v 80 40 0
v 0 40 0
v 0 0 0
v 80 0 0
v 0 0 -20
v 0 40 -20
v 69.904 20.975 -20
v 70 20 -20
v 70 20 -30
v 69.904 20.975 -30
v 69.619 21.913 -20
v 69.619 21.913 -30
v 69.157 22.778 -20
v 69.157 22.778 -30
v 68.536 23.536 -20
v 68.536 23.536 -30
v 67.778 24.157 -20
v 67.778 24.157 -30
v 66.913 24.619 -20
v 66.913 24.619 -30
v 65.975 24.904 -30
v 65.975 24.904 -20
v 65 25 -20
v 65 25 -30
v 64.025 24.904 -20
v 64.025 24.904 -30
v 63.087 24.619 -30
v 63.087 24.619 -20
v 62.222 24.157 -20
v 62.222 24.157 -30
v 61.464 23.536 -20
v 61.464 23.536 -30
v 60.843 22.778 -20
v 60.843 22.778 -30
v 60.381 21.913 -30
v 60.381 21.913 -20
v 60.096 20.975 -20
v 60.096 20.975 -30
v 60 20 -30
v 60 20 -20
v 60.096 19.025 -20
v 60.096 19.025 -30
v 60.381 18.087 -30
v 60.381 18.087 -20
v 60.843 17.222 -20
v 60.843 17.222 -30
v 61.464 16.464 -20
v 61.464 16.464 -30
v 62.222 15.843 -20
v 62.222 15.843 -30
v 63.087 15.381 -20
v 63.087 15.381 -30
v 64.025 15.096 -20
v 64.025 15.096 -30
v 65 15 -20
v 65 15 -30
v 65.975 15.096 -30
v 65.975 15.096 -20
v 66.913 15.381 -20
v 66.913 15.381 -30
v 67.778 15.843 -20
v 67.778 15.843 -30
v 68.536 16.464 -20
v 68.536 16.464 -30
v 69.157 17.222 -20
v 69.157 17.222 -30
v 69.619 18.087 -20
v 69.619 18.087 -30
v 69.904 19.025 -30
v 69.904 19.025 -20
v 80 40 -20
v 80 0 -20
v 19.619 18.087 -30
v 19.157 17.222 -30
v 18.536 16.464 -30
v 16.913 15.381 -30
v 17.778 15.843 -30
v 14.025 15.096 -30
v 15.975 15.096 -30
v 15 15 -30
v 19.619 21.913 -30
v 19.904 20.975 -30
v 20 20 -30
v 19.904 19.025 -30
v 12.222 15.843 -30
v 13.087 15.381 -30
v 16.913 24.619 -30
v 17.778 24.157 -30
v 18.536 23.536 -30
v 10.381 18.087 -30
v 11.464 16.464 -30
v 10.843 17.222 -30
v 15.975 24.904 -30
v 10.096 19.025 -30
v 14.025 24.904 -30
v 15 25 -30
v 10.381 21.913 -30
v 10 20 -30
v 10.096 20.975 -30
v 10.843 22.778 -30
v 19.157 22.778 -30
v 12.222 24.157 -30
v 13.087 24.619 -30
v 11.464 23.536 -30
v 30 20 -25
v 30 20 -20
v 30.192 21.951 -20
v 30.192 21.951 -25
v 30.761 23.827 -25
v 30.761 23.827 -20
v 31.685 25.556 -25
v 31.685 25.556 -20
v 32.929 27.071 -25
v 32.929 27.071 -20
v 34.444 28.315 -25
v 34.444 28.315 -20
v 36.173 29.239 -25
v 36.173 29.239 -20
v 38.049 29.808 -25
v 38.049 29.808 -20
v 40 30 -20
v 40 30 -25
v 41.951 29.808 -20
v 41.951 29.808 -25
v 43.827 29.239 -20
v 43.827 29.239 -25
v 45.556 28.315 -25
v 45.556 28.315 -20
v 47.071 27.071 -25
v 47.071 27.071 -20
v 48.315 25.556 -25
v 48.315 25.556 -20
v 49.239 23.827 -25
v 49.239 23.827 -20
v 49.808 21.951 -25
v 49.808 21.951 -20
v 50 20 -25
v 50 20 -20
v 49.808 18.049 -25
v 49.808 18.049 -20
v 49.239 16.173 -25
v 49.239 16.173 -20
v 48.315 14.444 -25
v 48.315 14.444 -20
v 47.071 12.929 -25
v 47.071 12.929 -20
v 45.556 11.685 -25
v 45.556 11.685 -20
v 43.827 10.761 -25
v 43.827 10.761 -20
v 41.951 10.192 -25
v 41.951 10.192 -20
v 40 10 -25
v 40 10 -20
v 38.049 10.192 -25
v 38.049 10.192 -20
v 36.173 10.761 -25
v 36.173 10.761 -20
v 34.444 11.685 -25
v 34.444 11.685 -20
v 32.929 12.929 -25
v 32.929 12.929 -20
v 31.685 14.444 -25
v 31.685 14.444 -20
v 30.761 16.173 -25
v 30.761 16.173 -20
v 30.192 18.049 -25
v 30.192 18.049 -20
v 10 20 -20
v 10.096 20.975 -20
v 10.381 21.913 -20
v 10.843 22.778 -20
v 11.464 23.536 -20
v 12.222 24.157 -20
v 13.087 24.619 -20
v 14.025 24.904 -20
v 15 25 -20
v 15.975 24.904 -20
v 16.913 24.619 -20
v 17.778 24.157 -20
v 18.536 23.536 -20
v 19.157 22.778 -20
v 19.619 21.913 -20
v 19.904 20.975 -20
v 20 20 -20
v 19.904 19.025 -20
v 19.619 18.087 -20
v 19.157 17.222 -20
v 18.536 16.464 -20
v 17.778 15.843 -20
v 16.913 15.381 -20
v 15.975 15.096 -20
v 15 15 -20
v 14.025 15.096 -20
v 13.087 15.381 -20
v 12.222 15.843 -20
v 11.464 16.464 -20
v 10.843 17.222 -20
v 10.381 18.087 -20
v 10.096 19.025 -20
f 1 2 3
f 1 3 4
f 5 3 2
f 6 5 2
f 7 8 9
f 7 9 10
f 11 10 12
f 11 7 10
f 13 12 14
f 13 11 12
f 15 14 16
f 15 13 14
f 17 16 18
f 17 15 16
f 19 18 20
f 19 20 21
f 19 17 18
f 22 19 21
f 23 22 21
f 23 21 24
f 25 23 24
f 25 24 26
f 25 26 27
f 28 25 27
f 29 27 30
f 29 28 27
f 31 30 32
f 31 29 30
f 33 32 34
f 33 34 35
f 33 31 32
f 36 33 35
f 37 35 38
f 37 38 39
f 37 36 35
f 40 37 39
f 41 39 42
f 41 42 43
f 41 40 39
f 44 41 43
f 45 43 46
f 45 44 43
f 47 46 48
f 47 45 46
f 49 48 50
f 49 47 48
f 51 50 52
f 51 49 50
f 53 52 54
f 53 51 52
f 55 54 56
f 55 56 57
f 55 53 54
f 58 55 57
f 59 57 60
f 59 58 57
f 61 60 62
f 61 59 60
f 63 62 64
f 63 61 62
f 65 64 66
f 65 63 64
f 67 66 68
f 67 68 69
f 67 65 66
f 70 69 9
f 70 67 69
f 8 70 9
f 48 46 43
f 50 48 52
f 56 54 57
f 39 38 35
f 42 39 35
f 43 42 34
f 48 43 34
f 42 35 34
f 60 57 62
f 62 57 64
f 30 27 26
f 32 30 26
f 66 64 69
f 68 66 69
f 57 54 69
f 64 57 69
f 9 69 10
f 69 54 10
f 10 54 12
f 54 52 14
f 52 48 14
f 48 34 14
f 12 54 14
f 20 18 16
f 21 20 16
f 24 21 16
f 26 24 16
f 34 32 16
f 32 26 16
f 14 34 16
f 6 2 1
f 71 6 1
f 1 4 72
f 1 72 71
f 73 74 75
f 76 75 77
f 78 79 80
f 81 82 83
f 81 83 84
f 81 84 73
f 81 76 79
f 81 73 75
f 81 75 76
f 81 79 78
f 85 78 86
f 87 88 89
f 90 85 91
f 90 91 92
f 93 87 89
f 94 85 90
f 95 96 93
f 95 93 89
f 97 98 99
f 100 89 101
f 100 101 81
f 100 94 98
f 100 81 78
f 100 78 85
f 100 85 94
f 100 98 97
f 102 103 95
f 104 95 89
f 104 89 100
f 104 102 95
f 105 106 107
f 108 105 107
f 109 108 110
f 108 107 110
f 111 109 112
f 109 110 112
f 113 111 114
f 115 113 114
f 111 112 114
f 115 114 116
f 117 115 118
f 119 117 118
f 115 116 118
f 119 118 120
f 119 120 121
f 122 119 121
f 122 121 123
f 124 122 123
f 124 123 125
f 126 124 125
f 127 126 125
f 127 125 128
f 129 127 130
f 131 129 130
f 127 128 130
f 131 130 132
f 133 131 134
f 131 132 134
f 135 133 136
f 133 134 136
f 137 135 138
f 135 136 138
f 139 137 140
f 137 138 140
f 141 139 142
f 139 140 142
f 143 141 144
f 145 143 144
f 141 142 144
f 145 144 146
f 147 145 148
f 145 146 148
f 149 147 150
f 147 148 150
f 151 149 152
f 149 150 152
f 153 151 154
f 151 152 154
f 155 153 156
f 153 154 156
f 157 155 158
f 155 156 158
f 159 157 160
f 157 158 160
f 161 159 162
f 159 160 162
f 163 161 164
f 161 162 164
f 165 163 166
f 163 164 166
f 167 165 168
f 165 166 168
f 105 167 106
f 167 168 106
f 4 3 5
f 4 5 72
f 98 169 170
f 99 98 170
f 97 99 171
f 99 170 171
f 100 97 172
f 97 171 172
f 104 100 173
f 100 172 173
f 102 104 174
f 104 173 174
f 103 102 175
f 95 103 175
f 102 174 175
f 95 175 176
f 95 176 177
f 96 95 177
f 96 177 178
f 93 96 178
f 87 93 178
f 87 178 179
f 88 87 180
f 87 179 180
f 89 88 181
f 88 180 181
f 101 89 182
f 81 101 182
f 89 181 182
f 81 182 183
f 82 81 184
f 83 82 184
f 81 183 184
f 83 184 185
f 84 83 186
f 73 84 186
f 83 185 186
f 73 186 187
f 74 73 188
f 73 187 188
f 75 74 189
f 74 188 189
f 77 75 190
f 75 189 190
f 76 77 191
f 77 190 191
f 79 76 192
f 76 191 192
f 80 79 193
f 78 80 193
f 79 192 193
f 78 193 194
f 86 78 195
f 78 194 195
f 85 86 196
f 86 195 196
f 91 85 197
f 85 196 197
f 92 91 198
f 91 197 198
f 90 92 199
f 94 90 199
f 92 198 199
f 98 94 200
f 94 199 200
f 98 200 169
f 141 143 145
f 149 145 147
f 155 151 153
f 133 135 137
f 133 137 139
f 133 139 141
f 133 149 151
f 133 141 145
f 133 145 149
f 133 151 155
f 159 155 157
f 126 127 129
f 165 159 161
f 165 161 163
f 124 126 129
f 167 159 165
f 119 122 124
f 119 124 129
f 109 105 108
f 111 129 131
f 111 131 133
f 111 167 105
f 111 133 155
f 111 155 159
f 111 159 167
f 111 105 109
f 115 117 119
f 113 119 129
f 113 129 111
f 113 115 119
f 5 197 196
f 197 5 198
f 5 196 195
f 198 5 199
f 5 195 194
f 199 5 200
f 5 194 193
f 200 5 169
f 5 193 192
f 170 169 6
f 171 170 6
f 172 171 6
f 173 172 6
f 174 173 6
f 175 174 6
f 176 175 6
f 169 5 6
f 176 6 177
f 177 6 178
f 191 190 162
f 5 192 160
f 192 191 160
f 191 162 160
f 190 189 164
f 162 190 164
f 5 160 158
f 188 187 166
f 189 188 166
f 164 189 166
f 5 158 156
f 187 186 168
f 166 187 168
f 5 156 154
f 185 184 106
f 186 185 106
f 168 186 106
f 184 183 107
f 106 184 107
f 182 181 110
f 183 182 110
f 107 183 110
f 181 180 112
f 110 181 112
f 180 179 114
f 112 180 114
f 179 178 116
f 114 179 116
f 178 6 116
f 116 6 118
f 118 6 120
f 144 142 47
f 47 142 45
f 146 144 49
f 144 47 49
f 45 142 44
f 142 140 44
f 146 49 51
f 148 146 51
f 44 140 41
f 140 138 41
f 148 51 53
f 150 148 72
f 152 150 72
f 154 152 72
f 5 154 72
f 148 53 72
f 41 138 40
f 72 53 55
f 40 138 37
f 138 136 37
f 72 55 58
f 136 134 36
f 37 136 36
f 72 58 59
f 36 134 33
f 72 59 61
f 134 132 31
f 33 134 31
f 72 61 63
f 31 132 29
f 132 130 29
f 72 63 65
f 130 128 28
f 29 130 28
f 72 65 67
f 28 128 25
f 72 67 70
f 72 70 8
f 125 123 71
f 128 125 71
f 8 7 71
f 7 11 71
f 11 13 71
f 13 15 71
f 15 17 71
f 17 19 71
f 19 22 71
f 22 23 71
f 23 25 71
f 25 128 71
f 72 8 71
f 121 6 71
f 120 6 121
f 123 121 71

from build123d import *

# Parameters (mm, degrees)
SKETCH1_W           = 80
SKETCH1_H           = 40
BOSS_EXTRUDE1_DEPTH = 20
SKETCH2_R           = 10
BOSS_EXTRUDE2_DEPTH = 5
SKETCH3_R           = 5
BOSS_EXTRUDE3_DEPTH = 10


with BuildPart() as part:
    # Sketch1 → Boss-Extrude1 (new body)
    with BuildSketch(Plane.XY):
        with Locations((40, 20)):
            Rectangle(SKETCH1_W, SKETCH1_H)
    extrude(amount=-BOSS_EXTRUDE1_DEPTH)

    # Sketch2 → Boss-Extrude2 (add)
    with BuildSketch(Plane(origin=(0, 0, -20), x_dir=(-1, 0, 0), z_dir=(0, 0, -1))):
        with Locations((-40, 20)):
            Circle(SKETCH2_R)
    extrude(amount=BOSS_EXTRUDE2_DEPTH)

    # Sketch3 → Boss-Extrude3 (add)
    with BuildSketch(Plane(origin=(0, 0, -20), x_dir=(-1, 0, 0), z_dir=(0, 0, -1))):
        with Locations((-15, 20)):
            Circle(SKETCH3_R)
    boss_extrude3 = extrude(amount=BOSS_EXTRUDE3_DEPTH)

    # Mirror1: Boss-Extrude3 across plane
    add(boss_extrude3.mirror(Plane.ZY.offset(-40)))


solid = part.part
